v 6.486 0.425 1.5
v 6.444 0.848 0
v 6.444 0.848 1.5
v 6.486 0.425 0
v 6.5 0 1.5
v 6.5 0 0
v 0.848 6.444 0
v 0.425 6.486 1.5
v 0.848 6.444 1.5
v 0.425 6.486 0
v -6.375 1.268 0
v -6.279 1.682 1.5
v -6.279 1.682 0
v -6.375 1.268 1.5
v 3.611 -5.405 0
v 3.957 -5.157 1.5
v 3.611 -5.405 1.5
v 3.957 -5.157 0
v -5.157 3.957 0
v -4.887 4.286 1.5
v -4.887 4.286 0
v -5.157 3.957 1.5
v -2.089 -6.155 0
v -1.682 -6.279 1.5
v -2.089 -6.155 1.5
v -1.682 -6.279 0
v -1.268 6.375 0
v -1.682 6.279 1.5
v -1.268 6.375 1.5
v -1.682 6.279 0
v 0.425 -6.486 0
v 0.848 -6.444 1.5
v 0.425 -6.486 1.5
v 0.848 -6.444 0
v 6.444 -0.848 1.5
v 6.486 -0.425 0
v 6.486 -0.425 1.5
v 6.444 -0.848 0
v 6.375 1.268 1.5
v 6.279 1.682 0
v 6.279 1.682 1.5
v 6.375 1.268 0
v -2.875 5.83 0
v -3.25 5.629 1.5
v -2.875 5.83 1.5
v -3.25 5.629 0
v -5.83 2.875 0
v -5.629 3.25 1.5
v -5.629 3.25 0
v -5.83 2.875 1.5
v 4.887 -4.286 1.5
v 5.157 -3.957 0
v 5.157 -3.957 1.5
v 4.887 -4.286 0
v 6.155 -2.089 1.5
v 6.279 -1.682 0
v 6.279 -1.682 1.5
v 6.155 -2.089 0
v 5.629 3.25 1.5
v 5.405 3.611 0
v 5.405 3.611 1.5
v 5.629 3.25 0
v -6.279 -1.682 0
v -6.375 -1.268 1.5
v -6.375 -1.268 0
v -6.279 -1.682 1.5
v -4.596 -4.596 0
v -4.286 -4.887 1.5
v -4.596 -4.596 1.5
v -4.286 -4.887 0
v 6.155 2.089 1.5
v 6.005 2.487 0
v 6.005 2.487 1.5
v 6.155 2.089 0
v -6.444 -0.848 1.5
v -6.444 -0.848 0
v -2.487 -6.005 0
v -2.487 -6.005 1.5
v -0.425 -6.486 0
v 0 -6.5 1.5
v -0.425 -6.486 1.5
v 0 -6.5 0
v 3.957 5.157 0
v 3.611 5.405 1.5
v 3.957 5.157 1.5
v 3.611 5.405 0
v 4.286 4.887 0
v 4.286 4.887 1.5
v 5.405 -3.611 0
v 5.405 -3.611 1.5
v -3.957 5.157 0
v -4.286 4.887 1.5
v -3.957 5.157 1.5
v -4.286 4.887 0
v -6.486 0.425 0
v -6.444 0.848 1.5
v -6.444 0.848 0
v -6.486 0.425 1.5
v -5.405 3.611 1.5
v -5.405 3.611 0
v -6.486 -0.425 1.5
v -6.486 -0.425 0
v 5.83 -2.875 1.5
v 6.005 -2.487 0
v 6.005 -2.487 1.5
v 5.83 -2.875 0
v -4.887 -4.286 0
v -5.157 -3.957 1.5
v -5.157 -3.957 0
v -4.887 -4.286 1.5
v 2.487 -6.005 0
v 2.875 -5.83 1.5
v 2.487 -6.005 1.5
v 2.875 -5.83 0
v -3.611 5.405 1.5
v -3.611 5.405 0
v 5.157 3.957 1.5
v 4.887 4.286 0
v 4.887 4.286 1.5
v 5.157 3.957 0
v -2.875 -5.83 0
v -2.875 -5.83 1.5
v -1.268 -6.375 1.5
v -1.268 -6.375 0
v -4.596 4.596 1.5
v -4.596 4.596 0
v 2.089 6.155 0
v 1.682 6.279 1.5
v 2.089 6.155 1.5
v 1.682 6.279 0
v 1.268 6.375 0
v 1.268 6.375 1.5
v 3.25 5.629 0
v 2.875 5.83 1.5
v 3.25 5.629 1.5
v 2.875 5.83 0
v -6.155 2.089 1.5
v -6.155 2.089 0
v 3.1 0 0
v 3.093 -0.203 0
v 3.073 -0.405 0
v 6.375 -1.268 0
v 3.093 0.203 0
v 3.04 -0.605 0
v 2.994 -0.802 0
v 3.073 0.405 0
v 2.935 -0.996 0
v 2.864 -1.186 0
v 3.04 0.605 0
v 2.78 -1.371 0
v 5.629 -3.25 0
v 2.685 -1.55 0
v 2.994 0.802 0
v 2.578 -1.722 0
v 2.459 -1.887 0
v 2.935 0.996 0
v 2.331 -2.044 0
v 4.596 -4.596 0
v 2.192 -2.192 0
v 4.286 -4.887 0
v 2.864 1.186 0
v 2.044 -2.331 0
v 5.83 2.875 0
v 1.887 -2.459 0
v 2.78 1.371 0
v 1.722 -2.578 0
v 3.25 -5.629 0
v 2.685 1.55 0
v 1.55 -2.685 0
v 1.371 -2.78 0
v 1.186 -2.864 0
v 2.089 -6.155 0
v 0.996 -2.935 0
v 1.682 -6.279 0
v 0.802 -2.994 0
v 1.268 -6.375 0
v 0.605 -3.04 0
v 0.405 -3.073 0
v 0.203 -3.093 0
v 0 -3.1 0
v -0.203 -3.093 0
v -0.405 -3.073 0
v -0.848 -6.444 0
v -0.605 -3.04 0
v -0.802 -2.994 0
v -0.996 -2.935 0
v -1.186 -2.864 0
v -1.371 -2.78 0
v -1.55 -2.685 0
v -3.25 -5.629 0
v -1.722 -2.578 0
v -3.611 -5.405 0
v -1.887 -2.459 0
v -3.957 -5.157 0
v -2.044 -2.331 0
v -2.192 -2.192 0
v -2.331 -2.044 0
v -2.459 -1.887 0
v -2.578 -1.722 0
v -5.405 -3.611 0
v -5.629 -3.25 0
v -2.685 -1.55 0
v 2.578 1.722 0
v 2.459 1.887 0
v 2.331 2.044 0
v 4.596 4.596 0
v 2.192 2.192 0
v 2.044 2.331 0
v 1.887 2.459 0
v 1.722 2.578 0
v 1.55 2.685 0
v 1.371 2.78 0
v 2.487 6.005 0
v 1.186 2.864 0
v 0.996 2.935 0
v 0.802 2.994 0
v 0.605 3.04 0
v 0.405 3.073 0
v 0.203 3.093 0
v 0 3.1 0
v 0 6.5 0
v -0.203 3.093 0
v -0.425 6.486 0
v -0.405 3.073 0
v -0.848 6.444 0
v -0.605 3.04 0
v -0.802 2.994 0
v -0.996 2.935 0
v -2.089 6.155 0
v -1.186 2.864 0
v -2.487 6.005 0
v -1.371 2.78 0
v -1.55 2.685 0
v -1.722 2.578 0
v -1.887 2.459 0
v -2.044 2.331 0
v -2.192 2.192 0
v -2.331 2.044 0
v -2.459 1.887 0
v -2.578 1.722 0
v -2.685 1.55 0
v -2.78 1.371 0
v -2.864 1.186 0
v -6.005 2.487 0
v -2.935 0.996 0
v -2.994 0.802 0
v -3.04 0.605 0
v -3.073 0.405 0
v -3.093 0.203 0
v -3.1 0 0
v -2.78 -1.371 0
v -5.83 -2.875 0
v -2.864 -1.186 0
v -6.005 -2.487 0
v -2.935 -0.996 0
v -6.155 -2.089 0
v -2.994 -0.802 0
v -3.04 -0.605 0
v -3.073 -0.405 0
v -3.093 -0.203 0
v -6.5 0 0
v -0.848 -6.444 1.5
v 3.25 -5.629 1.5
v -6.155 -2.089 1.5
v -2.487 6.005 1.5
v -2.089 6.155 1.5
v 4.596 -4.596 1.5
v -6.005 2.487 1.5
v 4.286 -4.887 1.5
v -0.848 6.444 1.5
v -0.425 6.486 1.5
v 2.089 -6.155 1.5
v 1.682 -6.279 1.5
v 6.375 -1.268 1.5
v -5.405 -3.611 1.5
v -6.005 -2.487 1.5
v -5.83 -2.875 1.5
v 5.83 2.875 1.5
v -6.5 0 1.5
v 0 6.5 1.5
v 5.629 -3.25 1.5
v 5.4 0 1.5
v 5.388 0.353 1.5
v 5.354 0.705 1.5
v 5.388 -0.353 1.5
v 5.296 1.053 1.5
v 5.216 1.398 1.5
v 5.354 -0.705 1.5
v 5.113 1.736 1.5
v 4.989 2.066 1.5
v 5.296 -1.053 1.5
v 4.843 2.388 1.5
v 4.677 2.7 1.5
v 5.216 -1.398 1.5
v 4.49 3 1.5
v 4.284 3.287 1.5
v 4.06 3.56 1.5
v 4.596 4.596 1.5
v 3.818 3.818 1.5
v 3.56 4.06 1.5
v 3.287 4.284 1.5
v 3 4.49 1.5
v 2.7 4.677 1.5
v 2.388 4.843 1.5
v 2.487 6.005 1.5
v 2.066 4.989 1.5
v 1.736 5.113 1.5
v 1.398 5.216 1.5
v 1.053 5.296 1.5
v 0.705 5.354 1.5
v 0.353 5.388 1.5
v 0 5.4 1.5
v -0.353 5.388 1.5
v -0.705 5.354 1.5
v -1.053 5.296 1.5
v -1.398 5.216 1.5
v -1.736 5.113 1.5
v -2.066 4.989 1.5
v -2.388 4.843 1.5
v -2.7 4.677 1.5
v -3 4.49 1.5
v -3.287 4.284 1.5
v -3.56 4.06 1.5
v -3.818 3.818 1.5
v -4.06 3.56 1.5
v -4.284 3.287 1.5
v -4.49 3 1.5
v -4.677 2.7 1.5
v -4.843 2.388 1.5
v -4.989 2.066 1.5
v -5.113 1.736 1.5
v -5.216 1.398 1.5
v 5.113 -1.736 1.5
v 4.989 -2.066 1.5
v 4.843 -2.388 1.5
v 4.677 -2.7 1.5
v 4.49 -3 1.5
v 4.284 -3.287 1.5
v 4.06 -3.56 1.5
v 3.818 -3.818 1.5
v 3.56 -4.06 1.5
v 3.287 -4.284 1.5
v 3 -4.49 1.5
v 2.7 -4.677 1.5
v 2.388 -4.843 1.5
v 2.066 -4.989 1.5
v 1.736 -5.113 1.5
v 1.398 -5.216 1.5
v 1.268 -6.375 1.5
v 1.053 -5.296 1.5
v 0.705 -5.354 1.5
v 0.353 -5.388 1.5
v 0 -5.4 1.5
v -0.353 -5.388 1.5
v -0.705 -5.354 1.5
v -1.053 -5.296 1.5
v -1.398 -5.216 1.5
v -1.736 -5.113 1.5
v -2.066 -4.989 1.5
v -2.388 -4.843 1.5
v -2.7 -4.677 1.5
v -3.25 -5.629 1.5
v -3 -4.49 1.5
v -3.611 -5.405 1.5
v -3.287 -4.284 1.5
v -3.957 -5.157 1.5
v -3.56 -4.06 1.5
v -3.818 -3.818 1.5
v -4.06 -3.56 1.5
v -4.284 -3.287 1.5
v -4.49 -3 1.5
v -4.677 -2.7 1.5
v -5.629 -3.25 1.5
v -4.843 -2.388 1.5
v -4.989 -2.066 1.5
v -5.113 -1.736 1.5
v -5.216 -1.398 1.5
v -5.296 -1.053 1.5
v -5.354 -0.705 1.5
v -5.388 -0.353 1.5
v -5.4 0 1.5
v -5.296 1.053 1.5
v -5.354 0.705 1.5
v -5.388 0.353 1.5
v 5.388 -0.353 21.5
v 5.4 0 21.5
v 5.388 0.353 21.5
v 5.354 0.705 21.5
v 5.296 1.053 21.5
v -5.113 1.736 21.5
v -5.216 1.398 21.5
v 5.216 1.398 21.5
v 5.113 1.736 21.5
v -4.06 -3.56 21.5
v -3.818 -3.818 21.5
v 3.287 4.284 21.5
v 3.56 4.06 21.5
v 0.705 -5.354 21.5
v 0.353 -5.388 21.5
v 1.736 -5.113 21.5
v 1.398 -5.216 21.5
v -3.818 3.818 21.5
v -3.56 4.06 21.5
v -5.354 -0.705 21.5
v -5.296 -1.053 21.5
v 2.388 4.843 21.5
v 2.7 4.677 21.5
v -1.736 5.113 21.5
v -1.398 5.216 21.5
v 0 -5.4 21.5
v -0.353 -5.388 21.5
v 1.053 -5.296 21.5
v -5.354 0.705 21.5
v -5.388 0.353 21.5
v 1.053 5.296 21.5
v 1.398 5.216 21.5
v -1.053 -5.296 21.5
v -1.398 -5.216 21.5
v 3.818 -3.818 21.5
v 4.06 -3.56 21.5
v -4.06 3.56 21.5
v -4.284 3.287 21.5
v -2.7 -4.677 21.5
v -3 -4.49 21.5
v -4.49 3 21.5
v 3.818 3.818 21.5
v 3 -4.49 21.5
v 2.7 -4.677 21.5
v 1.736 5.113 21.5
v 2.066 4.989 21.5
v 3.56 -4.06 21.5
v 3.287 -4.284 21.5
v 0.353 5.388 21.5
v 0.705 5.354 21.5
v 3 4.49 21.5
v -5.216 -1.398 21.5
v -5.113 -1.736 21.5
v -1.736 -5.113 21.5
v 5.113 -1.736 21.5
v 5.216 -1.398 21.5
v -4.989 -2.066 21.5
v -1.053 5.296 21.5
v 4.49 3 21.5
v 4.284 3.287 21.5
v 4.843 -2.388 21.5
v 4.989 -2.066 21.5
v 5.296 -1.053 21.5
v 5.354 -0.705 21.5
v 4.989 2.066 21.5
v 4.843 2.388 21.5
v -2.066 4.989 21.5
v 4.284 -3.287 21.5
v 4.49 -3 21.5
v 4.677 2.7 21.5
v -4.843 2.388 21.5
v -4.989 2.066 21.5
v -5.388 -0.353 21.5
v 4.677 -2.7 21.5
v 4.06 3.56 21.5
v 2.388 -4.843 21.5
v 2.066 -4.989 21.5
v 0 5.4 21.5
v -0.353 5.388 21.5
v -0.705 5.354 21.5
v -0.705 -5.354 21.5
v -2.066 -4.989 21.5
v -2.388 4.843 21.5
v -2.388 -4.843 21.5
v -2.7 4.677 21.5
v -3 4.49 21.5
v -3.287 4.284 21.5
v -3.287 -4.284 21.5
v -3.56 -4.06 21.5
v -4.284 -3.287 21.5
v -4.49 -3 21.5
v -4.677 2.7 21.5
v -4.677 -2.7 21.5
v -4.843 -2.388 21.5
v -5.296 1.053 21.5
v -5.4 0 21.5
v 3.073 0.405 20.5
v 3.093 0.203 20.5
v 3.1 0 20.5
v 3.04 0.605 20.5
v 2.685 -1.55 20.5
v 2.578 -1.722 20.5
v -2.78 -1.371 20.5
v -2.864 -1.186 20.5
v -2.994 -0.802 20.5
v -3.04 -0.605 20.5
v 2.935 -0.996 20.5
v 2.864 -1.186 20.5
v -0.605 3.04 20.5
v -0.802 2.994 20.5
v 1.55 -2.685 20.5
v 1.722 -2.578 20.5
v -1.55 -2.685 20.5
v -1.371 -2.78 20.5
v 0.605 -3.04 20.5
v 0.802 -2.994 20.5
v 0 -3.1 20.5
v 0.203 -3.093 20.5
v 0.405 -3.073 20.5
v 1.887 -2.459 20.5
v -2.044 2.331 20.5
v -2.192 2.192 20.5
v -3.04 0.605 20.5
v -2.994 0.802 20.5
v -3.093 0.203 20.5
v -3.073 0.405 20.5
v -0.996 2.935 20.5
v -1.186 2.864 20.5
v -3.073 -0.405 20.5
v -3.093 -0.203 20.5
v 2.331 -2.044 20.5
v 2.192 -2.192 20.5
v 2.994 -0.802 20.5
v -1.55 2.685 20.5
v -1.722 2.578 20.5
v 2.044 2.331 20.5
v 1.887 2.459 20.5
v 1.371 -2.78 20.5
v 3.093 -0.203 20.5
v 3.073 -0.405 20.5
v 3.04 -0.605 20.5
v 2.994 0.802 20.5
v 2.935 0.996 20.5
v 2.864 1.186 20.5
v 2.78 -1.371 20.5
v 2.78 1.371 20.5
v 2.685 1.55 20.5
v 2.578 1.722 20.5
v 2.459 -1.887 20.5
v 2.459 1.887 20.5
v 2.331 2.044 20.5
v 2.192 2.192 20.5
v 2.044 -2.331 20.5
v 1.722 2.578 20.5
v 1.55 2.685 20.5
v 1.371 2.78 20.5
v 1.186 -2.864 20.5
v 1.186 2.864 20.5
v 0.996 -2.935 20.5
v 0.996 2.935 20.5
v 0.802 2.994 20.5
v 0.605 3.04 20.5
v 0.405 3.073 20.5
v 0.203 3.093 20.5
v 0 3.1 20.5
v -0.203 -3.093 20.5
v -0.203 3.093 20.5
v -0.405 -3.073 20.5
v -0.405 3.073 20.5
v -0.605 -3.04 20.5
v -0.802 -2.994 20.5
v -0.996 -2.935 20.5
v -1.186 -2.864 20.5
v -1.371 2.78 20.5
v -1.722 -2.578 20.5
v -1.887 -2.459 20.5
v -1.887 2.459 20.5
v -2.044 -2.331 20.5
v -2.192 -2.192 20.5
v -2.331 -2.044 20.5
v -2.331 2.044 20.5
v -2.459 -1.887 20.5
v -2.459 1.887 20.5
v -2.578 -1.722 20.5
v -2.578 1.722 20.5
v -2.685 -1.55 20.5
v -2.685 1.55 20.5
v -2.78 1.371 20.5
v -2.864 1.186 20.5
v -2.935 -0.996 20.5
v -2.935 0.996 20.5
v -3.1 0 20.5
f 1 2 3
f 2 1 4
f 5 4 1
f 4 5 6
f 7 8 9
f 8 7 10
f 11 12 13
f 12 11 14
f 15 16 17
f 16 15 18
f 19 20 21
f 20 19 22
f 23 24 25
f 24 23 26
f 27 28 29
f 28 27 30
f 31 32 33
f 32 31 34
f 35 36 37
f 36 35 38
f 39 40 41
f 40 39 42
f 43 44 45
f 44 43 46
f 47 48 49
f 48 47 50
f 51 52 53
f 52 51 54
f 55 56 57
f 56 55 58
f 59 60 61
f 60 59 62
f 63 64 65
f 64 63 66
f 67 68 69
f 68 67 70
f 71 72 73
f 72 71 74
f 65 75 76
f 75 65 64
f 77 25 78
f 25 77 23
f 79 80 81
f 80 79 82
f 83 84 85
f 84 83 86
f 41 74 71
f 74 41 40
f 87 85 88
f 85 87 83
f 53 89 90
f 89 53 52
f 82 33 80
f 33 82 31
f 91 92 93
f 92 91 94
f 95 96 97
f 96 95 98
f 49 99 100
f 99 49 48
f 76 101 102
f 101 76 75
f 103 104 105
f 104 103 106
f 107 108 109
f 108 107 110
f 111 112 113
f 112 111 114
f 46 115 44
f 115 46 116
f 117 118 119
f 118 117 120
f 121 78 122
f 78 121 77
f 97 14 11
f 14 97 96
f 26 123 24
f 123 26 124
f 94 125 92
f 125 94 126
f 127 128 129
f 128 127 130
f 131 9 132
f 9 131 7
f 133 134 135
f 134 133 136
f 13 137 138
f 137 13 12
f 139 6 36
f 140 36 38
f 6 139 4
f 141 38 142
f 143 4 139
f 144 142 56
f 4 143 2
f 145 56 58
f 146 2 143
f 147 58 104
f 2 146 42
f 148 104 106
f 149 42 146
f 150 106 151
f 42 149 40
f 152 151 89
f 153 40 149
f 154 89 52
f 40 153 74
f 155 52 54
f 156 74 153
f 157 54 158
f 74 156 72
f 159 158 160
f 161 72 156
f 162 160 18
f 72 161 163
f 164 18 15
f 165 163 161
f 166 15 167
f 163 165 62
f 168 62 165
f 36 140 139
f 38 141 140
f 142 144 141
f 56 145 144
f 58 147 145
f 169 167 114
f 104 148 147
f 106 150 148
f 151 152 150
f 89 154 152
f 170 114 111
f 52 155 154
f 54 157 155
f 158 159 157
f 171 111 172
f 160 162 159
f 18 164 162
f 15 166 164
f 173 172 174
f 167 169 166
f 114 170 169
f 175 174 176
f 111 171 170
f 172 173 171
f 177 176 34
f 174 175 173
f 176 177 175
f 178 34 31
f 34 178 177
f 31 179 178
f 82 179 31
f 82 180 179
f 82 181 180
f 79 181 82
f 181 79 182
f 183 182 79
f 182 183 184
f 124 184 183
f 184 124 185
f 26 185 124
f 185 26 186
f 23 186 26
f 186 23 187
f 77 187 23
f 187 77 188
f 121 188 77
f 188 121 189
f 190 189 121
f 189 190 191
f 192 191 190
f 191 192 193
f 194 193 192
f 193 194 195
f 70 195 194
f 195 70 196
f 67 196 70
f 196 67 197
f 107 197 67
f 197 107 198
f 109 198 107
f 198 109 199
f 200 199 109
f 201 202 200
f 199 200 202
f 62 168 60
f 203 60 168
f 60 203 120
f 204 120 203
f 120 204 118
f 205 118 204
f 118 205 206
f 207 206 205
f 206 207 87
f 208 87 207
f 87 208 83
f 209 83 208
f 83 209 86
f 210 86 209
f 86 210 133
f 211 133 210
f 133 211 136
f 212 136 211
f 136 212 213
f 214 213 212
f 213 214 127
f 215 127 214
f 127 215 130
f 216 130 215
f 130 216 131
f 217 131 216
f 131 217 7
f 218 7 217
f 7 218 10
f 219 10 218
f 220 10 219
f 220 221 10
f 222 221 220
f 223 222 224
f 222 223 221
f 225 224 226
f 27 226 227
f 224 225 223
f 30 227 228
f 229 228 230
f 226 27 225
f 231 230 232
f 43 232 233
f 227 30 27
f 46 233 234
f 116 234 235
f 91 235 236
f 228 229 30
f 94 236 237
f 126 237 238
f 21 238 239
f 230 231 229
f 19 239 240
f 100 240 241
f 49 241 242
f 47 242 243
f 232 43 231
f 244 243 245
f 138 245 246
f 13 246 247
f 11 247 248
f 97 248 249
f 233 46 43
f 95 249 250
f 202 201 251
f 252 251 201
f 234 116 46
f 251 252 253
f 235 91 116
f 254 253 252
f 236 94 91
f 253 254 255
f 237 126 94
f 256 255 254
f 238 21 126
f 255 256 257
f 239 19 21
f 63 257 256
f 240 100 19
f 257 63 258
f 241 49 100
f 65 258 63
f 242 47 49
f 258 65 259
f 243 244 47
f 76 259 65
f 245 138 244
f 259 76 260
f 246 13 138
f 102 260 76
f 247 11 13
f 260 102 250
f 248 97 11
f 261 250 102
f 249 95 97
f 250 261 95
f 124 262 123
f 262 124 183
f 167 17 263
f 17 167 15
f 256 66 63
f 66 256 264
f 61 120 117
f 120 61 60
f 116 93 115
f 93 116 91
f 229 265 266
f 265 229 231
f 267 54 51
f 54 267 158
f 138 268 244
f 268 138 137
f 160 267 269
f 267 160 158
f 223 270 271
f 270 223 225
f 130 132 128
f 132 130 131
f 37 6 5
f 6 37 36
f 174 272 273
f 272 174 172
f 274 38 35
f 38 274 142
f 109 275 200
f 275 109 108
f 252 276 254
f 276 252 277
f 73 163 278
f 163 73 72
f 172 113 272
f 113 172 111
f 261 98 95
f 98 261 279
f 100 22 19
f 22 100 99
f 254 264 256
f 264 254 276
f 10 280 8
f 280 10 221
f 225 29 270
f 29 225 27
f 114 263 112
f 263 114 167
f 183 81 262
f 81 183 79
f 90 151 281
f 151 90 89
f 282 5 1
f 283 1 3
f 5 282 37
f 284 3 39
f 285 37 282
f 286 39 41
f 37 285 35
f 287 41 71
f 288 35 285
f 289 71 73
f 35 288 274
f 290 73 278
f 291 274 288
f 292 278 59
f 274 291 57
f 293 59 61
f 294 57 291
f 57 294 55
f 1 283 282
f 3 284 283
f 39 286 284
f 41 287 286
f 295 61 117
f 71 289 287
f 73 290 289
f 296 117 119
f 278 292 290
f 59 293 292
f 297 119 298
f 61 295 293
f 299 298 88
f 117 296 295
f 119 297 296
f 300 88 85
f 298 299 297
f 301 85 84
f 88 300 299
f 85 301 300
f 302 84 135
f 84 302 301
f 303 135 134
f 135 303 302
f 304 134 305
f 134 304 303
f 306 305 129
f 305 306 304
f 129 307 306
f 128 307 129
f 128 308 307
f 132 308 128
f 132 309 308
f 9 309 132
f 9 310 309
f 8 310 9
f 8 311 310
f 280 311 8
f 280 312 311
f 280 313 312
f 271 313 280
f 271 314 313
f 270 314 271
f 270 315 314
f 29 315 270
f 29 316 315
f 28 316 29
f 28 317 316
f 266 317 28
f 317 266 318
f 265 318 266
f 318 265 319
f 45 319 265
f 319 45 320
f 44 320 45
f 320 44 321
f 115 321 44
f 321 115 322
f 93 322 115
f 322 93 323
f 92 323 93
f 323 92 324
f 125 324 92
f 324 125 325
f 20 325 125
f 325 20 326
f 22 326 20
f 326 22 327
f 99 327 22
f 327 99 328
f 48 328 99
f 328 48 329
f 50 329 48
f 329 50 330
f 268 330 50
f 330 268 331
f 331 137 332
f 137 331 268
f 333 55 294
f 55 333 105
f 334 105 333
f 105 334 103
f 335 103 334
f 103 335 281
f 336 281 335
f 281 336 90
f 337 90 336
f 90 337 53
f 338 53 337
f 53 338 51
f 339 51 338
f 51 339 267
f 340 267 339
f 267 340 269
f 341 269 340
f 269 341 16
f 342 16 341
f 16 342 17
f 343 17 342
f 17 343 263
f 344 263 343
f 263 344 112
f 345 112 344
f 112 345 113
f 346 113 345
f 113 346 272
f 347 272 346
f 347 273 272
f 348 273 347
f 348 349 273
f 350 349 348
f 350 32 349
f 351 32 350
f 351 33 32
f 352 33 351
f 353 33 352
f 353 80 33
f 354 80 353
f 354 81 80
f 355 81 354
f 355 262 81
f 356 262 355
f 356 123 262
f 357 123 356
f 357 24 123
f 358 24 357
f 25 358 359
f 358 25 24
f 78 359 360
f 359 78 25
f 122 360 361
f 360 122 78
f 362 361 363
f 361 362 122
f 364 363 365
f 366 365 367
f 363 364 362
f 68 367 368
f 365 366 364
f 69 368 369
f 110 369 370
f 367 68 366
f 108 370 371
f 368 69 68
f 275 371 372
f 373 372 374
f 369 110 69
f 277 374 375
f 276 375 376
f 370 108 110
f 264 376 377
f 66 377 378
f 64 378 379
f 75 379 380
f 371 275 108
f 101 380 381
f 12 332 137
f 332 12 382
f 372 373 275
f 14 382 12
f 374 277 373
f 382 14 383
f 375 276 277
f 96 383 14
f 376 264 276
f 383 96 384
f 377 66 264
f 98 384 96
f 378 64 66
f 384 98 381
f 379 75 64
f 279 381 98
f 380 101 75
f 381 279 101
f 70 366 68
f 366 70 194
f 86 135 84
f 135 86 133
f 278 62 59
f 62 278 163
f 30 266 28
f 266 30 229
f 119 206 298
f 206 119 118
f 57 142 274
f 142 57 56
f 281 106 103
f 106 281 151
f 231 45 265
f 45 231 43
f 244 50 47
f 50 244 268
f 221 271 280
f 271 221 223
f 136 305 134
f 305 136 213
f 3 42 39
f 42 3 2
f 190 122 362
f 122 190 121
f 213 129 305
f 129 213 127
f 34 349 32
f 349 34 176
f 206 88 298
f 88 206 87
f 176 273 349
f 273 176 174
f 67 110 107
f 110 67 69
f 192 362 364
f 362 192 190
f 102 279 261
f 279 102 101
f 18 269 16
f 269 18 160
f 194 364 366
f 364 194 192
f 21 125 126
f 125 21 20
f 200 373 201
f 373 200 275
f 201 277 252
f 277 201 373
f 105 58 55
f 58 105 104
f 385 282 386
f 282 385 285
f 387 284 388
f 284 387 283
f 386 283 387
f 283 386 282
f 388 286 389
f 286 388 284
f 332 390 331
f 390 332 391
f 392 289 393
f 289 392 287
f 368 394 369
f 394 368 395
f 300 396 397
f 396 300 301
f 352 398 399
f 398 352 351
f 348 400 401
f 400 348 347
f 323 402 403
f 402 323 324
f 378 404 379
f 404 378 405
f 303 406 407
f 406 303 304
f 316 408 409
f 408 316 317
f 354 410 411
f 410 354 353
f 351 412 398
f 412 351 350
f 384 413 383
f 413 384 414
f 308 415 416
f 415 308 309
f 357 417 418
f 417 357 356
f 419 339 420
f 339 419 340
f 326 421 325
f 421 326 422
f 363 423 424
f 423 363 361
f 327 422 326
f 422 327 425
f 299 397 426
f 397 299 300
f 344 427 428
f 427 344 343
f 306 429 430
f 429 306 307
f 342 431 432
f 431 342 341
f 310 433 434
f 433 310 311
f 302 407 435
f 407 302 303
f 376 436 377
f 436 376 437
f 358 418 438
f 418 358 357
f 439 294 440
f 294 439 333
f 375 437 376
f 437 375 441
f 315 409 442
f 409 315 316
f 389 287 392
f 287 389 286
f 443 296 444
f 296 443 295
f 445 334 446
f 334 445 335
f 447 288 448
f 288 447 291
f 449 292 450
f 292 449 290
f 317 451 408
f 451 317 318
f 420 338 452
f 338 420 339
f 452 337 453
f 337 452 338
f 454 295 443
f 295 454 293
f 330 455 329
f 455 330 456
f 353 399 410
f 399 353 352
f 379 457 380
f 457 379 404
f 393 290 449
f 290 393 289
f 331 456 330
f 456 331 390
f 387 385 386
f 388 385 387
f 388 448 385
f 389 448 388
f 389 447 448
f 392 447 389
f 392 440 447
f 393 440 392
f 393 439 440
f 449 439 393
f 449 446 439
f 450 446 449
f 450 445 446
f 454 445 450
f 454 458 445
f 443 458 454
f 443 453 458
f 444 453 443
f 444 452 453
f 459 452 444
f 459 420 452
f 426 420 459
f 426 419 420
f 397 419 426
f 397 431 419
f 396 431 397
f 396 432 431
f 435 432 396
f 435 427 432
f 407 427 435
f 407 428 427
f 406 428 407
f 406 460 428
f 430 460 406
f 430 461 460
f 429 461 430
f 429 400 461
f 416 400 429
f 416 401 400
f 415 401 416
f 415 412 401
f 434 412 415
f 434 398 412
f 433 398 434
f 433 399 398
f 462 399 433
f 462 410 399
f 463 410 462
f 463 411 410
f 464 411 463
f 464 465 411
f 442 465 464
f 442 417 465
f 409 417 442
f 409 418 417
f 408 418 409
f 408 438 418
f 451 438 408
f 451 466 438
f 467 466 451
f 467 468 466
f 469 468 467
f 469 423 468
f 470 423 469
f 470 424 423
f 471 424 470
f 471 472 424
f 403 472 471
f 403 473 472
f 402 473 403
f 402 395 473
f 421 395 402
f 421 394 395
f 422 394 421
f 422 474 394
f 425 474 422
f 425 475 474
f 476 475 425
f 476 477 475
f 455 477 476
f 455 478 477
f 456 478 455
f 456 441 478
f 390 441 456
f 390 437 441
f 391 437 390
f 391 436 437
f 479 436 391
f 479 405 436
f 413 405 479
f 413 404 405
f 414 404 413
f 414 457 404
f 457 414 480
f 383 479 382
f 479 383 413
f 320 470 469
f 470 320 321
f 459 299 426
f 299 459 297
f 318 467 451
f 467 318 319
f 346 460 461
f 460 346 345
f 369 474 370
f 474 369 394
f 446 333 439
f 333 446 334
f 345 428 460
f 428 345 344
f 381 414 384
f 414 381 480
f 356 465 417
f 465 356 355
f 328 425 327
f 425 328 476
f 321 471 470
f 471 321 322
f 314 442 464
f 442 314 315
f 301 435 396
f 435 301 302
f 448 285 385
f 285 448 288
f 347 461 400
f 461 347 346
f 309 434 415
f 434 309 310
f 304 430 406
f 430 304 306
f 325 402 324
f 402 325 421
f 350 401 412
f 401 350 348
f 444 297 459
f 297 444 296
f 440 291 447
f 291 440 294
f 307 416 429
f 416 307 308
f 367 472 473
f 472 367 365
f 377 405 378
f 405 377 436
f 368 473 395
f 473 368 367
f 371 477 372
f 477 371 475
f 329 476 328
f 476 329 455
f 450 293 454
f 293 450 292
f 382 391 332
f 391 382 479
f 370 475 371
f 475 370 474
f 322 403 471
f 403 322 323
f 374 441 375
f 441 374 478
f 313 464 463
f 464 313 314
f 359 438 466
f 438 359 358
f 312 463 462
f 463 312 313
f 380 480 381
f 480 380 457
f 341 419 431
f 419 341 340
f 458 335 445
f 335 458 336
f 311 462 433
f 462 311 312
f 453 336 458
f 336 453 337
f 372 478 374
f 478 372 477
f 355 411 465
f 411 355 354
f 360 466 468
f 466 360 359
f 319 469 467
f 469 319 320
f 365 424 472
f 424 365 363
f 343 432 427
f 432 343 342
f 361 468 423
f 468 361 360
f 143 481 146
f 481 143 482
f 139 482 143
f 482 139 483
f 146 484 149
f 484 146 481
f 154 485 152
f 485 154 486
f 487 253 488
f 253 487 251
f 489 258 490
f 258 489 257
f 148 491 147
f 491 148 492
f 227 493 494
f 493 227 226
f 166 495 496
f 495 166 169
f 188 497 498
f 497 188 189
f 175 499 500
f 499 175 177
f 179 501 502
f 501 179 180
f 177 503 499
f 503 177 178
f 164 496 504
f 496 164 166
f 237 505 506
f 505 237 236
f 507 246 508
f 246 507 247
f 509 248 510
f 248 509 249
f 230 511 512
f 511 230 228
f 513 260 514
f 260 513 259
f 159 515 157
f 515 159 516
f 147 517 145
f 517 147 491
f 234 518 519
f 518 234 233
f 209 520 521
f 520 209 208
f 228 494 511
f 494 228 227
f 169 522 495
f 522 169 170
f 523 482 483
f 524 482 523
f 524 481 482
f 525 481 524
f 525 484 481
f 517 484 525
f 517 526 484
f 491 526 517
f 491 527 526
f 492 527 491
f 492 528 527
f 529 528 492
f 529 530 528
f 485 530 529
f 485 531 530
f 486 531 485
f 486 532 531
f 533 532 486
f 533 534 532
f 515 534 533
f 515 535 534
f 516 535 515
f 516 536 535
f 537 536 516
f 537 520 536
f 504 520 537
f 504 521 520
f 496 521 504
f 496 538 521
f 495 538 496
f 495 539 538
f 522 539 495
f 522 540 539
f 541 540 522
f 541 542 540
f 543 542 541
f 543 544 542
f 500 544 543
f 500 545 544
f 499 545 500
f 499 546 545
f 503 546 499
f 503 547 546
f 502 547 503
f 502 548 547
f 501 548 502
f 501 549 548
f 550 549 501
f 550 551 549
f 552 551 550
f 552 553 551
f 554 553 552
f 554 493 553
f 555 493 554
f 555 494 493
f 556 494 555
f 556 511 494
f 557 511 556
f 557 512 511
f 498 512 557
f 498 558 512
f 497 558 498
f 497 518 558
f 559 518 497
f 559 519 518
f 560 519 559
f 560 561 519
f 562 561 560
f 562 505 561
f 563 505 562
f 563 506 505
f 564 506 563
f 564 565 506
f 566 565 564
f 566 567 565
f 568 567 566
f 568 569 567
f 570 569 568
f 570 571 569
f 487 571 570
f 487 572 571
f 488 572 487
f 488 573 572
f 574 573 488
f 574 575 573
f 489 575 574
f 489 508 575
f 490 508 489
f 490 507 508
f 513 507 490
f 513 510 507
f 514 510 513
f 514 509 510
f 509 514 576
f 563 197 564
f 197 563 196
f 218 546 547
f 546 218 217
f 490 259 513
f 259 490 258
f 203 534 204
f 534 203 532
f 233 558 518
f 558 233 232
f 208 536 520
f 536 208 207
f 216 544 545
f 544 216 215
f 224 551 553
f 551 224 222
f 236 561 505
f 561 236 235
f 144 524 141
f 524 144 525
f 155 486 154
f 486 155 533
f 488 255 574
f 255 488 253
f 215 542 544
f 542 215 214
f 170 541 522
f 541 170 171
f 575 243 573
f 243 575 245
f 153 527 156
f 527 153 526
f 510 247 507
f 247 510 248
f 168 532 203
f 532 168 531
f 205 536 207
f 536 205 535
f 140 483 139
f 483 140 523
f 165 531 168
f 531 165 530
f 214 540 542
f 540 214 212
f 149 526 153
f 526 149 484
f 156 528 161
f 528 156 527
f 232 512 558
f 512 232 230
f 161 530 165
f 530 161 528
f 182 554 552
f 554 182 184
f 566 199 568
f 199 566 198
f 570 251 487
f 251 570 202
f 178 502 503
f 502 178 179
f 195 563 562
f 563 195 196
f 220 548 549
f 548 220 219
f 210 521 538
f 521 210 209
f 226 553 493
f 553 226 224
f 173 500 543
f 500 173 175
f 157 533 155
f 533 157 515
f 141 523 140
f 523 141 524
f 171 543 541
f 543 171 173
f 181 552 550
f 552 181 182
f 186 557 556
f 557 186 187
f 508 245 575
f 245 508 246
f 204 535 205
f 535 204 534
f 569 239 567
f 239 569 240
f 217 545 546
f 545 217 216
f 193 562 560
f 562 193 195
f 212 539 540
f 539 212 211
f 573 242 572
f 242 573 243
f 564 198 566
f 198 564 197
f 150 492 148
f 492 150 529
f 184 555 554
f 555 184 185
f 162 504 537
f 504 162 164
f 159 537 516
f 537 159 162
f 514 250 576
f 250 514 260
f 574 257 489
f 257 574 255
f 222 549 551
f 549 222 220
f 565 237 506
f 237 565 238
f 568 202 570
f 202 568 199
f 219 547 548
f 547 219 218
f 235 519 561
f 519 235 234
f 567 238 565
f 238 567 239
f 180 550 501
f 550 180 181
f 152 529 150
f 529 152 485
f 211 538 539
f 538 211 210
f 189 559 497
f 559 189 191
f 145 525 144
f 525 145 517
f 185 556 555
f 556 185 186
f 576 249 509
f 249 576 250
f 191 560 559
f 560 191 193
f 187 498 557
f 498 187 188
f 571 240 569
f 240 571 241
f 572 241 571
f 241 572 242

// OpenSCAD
// PCR tube adapter sleeve - print upside down
// Units: mm

$fn = 96;

// --- Dimensions ---
collar_d      = 13;    // collar outer diameter (on bed)
collar_h      = 1.5;   // collar thickness (z = 0 to 1.5)
sleeve_od     = 10.8;  // sleeve outer diameter
sleeve_top_z  = 21.5;  // top of sleeve body (absolute z)
bore_d        = 6.2;   // through-bore diameter
eps           = 0.5;   // cutter overshoot past faces

// --- Derived ---
sleeve_h = sleeve_top_z - collar_h;  // sleeve body height (20 mm)

difference() {
    union() {
        // Collar
        cylinder(d = collar_d, h = collar_h);
        // Sleeve body (slightly overlapping collar for a clean union)
        translate([0, 0, collar_h - 0.01])
            cylinder(d = sleeve_od, h = sleeve_h + 0.01);
    }
    // Through-bore
    translate([0, 0, -eps])
        cylinder(d = bore_d, h = sleeve_h + 2 * eps);
}
